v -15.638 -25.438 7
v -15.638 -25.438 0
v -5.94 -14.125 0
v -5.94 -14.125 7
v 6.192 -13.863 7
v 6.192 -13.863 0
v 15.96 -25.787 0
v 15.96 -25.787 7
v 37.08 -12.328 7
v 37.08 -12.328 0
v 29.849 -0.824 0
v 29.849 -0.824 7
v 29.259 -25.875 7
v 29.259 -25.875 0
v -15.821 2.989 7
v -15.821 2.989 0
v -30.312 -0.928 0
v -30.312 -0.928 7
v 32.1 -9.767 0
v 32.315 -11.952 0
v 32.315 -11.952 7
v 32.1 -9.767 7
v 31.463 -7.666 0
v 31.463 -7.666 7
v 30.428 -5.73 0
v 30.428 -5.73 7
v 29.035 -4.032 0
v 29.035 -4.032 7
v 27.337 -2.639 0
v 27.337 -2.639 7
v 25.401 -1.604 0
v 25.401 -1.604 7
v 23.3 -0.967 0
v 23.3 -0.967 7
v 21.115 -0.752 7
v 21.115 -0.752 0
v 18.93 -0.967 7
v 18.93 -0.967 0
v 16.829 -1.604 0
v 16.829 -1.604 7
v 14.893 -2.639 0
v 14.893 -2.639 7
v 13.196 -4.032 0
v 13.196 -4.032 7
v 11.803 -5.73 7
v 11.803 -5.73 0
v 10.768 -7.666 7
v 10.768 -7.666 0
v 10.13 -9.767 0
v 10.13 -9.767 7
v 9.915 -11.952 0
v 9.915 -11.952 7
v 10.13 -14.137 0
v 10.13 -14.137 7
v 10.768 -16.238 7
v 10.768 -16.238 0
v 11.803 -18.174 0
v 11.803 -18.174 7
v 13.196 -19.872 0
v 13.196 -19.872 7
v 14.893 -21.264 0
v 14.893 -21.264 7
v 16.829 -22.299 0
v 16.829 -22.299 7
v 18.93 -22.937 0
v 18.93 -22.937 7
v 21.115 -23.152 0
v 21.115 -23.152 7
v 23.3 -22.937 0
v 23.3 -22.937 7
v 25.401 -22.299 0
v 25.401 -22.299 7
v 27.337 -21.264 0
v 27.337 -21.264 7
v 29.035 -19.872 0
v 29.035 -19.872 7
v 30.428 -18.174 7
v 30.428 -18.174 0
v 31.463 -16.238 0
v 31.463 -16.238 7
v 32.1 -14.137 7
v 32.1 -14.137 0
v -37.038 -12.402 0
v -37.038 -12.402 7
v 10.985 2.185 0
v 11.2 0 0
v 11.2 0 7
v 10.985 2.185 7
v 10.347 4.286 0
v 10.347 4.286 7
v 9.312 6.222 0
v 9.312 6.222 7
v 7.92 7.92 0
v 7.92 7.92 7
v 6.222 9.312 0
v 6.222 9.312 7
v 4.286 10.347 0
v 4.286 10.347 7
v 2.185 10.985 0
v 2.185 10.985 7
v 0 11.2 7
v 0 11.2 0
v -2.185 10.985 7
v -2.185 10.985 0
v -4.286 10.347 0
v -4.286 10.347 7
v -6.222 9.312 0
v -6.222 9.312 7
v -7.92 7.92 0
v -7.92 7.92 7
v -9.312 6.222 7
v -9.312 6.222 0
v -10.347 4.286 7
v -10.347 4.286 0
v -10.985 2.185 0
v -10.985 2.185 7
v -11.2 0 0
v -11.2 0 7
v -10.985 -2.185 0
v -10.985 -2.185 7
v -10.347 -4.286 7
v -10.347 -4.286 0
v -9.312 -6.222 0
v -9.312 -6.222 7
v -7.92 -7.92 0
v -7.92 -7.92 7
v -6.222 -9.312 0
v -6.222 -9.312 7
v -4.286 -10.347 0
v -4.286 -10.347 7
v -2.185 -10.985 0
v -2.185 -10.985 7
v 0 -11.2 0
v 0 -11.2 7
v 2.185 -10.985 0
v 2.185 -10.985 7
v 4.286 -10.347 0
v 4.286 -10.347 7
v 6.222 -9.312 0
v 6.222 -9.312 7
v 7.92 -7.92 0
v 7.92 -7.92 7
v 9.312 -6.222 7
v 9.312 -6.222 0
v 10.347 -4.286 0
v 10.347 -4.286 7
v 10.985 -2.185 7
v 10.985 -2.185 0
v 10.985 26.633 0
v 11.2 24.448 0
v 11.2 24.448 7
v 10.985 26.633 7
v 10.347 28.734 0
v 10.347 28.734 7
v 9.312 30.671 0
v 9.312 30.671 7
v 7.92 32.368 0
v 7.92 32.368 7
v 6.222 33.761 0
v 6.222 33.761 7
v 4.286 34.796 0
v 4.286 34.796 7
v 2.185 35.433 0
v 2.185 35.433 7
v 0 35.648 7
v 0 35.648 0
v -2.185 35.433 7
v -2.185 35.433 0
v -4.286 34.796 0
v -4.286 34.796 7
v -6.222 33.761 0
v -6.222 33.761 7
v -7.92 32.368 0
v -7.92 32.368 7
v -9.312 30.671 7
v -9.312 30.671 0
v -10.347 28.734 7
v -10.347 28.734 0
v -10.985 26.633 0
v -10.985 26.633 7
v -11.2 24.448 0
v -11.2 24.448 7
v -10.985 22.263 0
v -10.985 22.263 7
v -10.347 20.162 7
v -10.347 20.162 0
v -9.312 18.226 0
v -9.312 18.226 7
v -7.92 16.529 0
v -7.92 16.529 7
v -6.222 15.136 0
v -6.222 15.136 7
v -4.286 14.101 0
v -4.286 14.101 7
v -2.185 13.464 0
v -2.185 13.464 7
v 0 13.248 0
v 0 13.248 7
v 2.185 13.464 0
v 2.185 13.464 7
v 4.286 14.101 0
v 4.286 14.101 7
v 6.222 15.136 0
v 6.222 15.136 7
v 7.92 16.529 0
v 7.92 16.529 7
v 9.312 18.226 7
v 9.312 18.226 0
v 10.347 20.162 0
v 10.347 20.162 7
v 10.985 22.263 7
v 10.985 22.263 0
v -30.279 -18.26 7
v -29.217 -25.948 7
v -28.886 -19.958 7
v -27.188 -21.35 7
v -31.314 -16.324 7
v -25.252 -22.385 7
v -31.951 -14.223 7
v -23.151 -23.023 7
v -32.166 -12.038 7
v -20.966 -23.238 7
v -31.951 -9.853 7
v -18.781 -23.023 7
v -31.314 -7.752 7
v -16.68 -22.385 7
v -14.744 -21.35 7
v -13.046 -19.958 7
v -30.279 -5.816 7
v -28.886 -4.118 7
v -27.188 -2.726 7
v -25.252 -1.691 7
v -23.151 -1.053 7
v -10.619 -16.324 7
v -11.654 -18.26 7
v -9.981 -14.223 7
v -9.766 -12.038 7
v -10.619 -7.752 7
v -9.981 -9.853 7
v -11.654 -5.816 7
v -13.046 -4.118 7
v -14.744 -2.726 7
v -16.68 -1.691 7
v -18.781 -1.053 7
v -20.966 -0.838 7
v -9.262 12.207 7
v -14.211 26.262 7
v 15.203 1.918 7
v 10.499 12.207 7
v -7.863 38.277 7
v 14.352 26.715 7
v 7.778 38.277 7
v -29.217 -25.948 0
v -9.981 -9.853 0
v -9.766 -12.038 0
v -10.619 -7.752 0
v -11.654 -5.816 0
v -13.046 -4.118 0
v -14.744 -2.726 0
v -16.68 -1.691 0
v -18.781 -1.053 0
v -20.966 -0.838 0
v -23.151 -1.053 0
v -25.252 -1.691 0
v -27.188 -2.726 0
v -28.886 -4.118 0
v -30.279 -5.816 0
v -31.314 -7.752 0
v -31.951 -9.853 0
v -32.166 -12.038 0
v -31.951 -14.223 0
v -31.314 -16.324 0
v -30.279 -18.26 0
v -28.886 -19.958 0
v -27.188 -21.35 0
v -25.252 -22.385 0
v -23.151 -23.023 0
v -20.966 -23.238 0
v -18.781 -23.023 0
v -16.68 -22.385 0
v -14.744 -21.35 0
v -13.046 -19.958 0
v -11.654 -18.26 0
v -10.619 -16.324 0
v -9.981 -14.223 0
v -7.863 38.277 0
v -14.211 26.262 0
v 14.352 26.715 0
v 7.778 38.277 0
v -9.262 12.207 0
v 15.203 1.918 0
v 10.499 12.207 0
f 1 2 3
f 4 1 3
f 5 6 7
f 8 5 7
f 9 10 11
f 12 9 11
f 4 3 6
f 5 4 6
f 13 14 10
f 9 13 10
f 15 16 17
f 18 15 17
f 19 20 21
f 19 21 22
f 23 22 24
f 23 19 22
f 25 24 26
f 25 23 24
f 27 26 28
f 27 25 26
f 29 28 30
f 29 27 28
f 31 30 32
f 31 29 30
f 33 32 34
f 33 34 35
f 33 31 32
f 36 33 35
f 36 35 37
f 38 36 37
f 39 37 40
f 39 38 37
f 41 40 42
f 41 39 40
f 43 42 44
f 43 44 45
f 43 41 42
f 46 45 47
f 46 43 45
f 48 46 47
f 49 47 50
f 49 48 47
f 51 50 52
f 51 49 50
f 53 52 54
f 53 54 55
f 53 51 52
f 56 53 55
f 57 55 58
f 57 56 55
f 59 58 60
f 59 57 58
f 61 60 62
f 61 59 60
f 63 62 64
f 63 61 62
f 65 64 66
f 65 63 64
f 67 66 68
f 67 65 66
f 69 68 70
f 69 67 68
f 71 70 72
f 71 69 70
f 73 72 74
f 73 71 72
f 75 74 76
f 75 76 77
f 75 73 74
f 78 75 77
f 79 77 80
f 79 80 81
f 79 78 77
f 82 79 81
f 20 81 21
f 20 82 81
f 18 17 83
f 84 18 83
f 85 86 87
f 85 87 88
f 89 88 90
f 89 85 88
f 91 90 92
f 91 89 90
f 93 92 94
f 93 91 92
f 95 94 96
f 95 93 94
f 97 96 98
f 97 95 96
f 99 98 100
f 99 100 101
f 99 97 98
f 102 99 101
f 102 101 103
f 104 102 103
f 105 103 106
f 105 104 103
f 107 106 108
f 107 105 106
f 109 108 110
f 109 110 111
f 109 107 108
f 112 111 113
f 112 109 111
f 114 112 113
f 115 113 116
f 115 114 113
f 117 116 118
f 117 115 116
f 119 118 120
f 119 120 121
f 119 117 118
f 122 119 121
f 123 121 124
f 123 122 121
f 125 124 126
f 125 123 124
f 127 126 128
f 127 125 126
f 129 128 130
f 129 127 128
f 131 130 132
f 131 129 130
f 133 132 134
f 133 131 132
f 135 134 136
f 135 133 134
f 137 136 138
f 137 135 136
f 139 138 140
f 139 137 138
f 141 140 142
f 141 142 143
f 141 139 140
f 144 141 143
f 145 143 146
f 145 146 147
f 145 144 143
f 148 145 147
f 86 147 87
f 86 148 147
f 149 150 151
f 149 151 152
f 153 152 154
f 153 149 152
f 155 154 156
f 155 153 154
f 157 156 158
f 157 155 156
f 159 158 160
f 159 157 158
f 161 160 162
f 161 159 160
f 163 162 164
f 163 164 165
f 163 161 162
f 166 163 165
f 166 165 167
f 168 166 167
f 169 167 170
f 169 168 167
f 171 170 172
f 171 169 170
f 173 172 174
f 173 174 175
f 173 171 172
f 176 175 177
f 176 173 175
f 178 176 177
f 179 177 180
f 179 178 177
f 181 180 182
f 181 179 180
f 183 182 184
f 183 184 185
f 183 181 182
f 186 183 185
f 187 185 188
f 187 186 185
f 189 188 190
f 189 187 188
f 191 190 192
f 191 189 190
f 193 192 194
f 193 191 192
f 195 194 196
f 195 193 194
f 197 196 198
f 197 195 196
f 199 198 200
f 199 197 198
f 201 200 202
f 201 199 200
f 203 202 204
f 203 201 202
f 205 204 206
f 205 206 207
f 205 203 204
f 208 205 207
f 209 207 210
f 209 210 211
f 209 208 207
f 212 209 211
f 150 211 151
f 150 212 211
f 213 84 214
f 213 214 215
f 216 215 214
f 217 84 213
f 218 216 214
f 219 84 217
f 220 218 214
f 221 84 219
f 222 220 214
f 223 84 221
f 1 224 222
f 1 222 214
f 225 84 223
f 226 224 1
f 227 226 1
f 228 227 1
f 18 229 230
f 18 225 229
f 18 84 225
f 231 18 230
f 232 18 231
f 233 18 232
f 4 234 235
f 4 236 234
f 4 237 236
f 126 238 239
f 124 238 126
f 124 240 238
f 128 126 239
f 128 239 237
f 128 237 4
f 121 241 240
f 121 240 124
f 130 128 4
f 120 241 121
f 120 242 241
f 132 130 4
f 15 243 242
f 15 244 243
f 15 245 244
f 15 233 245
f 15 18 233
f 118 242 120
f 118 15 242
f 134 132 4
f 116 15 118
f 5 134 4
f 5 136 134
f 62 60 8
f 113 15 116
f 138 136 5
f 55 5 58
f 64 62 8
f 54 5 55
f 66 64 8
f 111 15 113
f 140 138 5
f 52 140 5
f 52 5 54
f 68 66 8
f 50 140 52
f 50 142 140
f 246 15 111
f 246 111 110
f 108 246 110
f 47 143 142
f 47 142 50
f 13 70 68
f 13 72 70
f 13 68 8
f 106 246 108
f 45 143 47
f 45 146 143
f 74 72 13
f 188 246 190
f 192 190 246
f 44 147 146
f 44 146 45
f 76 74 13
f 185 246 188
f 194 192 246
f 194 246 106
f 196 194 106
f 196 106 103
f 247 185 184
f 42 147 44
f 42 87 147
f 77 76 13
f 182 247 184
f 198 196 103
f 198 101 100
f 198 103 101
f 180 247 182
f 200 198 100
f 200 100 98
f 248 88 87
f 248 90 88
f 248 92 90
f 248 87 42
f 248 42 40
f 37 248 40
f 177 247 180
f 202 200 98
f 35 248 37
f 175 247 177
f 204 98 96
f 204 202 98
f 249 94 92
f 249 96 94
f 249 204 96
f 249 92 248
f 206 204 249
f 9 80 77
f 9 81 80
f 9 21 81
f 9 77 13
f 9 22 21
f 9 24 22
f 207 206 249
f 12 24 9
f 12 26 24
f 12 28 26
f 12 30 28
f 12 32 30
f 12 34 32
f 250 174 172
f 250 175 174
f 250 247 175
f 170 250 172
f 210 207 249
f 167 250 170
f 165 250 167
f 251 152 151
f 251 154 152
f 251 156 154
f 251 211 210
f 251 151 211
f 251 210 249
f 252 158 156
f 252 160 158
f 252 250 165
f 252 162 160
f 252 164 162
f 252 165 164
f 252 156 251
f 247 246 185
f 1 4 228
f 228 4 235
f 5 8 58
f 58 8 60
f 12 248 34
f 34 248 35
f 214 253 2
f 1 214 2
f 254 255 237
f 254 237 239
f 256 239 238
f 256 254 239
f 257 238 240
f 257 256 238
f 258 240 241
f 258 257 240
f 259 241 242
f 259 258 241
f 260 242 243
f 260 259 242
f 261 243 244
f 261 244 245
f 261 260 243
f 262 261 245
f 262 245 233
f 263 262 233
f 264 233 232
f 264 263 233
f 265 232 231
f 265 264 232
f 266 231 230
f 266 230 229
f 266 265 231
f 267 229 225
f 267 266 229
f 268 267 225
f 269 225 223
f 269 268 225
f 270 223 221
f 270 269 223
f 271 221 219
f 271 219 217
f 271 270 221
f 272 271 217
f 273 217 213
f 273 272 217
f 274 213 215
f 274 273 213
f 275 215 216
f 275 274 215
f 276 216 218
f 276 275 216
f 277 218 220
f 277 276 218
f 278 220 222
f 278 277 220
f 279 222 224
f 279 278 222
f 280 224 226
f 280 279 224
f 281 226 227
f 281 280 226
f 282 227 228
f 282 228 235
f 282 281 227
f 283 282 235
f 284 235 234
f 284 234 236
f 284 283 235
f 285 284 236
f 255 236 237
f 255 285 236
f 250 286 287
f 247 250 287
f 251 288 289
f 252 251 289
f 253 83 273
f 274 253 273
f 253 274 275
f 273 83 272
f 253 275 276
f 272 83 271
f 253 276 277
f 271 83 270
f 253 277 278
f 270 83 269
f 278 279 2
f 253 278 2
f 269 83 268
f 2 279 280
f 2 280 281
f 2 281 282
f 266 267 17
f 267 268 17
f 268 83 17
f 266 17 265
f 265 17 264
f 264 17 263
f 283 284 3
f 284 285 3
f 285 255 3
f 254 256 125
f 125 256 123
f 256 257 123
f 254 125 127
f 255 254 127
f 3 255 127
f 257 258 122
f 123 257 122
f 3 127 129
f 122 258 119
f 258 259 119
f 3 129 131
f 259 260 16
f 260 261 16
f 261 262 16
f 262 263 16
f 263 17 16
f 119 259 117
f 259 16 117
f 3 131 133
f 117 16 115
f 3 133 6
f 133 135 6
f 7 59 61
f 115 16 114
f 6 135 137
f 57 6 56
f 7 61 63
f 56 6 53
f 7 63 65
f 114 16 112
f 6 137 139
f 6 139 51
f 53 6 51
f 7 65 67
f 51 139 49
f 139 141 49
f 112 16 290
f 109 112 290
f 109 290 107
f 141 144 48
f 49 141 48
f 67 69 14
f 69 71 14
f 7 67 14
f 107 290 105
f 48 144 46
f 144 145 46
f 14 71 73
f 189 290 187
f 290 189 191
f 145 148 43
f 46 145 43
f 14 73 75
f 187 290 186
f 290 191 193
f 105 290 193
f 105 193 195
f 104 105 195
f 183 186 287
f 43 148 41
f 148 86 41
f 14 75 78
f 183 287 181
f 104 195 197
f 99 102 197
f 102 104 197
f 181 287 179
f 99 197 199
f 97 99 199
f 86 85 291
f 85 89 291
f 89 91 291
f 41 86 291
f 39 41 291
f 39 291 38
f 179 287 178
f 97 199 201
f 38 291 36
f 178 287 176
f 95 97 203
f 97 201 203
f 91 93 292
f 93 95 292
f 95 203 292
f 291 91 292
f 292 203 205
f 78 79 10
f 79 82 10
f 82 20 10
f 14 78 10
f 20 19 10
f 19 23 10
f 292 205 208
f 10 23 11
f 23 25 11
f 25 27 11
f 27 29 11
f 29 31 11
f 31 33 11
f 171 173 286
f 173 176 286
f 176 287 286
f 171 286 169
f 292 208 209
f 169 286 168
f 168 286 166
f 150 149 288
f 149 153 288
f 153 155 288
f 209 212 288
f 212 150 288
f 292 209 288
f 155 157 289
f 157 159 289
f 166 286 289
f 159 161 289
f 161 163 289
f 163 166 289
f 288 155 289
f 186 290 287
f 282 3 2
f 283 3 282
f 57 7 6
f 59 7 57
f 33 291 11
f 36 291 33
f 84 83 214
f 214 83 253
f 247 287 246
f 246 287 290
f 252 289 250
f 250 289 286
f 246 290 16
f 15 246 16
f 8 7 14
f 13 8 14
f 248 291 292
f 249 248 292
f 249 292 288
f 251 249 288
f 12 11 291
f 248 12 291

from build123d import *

# Parameters (mm, degrees)
F0_R     = 11.2
F1_DEPTH = 7
F2_DEPTH = 7


with BuildPart() as f1:
    # F0 (on Top) → F1 (new body)
    with BuildSketch(Plane.XY):
        Polygon((7.778355, 38.276713), (-7.863495, 38.276713), (-14.210913, 26.261959), (-9.26244, 12.206962), (-15.820878, 2.988639), (-30.312402, -0.928071), (-37.037784, -12.402103), (-29.216858, -25.948344), (-15.638067, -25.437992), (-5.940319, -14.12499), (6.191501, -13.86279), (15.959934, -25.787275), (29.259428, -25.87461), (37.080354, -12.32837), (29.848981, -0.823968), (15.20276, 1.918027), (10.498676, 12.206962), (14.352468, 26.715346), align=None)
        with Locations((-20.96608, -12.037974)):
            Circle(F0_R, mode=Mode.SUBTRACT)
        Circle(F0_R, mode=Mode.SUBTRACT)
        with Locations((21.115096, -11.951939)):
            Circle(F0_R, mode=Mode.SUBTRACT)
        with Locations((0, 24.448412)):
            Circle(F0_R, mode=Mode.SUBTRACT)
    extrude(amount=F1_DEPTH)

    # F0 (on Top) → F2 (join)
    with BuildSketch(Plane.XY):
        Polygon((7.778355, 38.276713), (-7.863495, 38.276713), (-14.210913, 26.261959), (-9.26244, 12.206962), (-15.820878, 2.988639), (-30.312402, -0.928071), (-37.037784, -12.402103), (-29.216858, -25.948344), (-15.638067, -25.437992), (-5.940319, -14.12499), (6.191501, -13.86279), (15.959934, -25.787275), (29.259428, -25.87461), (37.080354, -12.32837), (29.848981, -0.823968), (15.20276, 1.918027), (10.498676, 12.206962), (14.352468, 26.715346), align=None)
        with Locations((-20.96608, -12.037974)):
            Circle(F0_R, mode=Mode.SUBTRACT)
        Circle(F0_R, mode=Mode.SUBTRACT)
        with Locations((21.115096, -11.951939)):
            Circle(F0_R, mode=Mode.SUBTRACT)
        with Locations((0, 24.448412)):
            Circle(F0_R, mode=Mode.SUBTRACT)
    extrude(amount=F2_DEPTH)


solid = f1.part
